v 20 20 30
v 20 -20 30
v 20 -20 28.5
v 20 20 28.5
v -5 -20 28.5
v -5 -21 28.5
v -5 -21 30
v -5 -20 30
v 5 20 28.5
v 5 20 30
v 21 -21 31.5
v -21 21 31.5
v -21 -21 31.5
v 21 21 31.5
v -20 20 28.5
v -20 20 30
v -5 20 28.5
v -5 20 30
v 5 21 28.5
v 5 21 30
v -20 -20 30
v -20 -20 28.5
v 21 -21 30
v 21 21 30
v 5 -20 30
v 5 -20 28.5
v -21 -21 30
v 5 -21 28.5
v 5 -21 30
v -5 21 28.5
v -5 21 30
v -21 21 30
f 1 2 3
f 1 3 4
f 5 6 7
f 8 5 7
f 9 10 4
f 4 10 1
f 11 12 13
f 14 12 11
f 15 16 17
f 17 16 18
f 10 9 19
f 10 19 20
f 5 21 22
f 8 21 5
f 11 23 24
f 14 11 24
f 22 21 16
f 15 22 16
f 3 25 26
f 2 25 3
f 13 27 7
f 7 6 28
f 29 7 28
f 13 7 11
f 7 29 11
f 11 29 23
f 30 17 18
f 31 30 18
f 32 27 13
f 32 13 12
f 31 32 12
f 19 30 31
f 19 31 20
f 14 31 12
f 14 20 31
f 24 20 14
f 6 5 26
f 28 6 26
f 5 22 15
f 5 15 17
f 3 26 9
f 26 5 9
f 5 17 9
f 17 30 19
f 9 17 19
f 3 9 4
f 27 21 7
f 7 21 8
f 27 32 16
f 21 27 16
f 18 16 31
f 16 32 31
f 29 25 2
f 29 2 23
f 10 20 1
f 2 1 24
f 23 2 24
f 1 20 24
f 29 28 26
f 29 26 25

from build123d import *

# Parameters (mm, degrees)
SKETCH_W        = 42
SKETCH_H        = 42
PAD_DEPTH       = 30
SKETCH001_W     = 40
SKETCH001_H     = 40
POCKET_DEPTH    = 1.5
SKETCH002_W     = 38
SKETCH002_H     = 38
POCKET001_DEPTH = 28
SKETCH003_W     = 10
SKETCH003_H     = 5
POCKET002_DEPTH = 300
SKETCH004_W     = 42
SKETCH004_H     = 42
PAD001_DEPTH    = 1.5


with BuildPart() as pocket002:
    # Sketch → Pad (new body)
    with BuildSketch(Plane.XY):
        Rectangle(SKETCH_W, SKETCH_H)
    extrude(amount=PAD_DEPTH)

    # Sketch001 → Pocket (cut)
    with BuildSketch(Plane.XY.offset(30)):
        Rectangle(SKETCH001_W, SKETCH001_H)
    extrude(amount=-POCKET_DEPTH, mode=Mode.SUBTRACT)

    # Sketch002 → Pocket001 (cut)
    with BuildSketch(Plane.XY.offset(28.5)):
        Rectangle(SKETCH002_W, SKETCH002_H)
    extrude(amount=-POCKET001_DEPTH, mode=Mode.SUBTRACT)

    # Sketch003 → Pocket002 (cut)
    with BuildSketch(Plane.XZ.offset(21)):
        with Locations((0, 27.5)):
            Rectangle(SKETCH003_W, SKETCH003_H)
    extrude(amount=-POCKET002_DEPTH, mode=Mode.SUBTRACT)


with BuildPart() as cut:
    # Pad001 base: copy of Pocket002
    add(pocket002.part)

    # Sketch004 → Pad001 (new body, symmetric)
    with BuildSketch(Plane.XY.offset(30)):
        Rectangle(SKETCH004_W, SKETCH004_H)
    extrude(amount=PAD001_DEPTH, both=True)

    # Cut: cut Pocket002
    add(pocket002.part, mode=Mode.SUBTRACT)


solid = cut.part
